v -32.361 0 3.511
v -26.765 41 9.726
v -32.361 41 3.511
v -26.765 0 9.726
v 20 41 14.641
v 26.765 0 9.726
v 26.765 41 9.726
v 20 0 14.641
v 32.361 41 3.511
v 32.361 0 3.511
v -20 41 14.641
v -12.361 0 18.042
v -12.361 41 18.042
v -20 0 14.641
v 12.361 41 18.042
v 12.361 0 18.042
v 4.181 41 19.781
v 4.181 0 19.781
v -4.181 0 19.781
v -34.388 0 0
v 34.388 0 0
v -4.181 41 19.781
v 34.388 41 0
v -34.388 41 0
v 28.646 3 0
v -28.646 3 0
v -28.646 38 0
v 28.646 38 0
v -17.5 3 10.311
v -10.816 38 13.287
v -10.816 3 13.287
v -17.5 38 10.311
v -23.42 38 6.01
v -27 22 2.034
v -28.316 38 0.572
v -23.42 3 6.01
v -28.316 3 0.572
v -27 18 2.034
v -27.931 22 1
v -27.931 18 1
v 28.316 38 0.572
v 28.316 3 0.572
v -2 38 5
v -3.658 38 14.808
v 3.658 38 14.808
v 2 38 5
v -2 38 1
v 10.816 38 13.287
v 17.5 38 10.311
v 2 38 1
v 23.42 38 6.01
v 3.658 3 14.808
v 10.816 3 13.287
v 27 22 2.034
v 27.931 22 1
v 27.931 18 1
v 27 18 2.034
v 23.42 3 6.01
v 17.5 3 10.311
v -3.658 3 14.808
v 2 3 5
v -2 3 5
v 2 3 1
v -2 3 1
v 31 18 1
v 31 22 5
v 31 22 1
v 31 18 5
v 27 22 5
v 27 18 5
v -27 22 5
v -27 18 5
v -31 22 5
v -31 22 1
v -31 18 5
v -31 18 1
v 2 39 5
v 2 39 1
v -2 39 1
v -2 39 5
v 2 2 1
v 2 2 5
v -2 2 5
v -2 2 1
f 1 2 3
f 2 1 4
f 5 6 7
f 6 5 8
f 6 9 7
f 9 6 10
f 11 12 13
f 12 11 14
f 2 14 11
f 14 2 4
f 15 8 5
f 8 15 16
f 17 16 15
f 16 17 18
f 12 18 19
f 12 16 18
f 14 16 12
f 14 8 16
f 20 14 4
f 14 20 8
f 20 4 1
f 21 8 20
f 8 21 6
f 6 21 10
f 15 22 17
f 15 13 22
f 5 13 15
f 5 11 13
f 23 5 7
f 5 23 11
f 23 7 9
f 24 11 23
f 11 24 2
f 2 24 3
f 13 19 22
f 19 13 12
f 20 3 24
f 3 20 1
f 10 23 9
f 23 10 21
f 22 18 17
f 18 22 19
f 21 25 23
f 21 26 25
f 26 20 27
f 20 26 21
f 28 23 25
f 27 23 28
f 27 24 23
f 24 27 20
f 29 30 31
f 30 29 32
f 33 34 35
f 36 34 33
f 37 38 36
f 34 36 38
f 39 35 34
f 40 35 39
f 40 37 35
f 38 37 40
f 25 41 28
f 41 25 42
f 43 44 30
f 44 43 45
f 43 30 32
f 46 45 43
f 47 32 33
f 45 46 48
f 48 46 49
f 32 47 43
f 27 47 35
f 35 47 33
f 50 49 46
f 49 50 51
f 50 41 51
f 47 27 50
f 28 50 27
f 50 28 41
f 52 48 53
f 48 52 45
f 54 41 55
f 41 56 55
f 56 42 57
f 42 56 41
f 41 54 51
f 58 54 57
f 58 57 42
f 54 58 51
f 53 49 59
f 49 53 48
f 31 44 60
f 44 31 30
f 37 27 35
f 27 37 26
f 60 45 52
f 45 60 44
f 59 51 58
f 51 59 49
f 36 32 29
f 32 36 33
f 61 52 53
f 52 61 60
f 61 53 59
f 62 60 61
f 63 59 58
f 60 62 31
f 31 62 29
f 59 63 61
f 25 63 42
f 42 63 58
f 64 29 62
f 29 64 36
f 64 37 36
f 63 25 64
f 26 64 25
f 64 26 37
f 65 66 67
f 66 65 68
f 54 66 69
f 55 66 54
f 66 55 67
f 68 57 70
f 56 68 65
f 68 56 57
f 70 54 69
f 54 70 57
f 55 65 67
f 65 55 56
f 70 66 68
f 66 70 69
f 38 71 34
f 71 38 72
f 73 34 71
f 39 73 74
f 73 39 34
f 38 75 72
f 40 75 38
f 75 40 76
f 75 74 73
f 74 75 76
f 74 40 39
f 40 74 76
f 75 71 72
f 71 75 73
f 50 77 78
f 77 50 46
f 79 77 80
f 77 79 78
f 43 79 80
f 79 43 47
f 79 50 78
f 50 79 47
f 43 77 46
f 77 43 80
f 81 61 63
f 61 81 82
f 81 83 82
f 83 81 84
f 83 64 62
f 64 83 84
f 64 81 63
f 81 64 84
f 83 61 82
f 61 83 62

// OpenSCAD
/*
    TOS Version 1 Top
    

*/
rotate(a=[270,0,0]) {
    translate([0,20, 0]) {
        difference() {
            // Main Body Outside
            difference() {
                cylinder(h=41, r=40);
                translate([0,30,0]) {
                    cube(100, center=true);
                }
                
            };

            // Main Body Inside
            difference() {
          
                translate([0,0,3]) {
                    cylinder(h=35, r=35);
                };        
                translate([0,30,0]) {
                    cube(100, center=true);
                }

            };
            
            // Inside Recesses
            translate([29,-23,20]) {
                cube(4, center=true);
            }
            
            translate([-29,-23,20]) {
                cube(4, center=true);
            }
            
            translate([0,-23,37]) {
                cube(4, center=true);
            }
                
            translate([0,-23,4]) {
                cube(4, center=true);
            }
        }
    }
}
